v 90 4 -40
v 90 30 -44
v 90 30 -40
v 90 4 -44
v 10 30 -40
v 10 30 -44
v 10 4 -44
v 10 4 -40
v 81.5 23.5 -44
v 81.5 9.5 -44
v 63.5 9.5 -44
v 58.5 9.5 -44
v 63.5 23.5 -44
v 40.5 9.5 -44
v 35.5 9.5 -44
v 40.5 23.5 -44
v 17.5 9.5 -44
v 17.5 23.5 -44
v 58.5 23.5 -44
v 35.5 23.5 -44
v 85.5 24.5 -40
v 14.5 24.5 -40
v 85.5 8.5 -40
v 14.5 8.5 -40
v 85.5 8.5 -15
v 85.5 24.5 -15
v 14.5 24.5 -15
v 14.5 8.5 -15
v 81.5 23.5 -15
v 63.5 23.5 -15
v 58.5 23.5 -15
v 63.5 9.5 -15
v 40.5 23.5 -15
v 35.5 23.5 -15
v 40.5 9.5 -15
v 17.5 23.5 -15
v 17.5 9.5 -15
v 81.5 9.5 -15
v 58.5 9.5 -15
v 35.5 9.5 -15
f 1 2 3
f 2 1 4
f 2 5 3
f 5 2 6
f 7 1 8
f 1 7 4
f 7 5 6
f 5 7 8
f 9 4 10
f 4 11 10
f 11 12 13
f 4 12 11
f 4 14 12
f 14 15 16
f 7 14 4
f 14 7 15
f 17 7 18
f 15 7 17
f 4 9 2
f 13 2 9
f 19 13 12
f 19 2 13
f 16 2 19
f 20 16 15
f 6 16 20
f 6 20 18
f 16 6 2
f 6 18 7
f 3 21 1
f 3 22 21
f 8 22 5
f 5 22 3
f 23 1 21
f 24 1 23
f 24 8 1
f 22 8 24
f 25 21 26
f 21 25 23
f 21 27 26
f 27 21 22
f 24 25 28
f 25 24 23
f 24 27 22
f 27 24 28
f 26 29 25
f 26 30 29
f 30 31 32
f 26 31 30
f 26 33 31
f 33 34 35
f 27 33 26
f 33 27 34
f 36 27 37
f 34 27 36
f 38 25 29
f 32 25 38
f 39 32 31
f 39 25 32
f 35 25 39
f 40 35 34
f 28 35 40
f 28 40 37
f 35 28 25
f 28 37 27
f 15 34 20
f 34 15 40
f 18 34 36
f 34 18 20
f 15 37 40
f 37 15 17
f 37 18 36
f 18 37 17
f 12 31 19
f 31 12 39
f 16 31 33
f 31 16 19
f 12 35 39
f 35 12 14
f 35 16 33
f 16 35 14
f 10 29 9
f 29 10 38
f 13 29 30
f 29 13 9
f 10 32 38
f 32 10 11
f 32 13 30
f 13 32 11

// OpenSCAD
$fn=100;
// 高15mm

//BigBox();

//Rooms();

//rotate([90,0,0])
//WaterBox();
//scale([1,1,2])Room(50,20);


rotate([-90,0,0])
WaterBoxLid();

module WaterBoxLid()
{
    difference() {
        union() {
        translate([10,40,4])cube([80,4,30-4]);
        translate([14+0.5,14+1,8+0.5]) cube([80-8-1,30-1,30-8-4-1-1]);
        }
    
        translate([13+0.5+4,14,9+0.5]) cube([18,35,30-8-4-3-1]);
        
        translate([13+0.5+27,14,9+0.5]) cube([18,35,30-8-4-3-1]);
        
        translate([13+0.5+50,14,9+0.5]) cube([18,35,30-8-4-3-1]);
    }
}

module WaterBox()
{
    difference() {
        union() {
            translate([-30,0,4])cube([150-1,40-1,30-4-1]);
        
            translate([-30,0,4])cube([30-1,55,30-4-1]);
             
        }
        
    ScrewHole();
    translate([14,14,8-0.5]) cube([80-8,40,30-8-4]);
          //  translate([14,4,8]) cube([95,30,30-8-4]);
            translate([-30+4,10,8-0.5]) cube([140,25,30-8-4]);
        
        translate([-20+5,83,17-0.5])rotate([90,0,0])cylinder(d=22,h=50);
    }
}

module SwitchKey()
{
    rotate([180,0,0]) {
MyTranslateCube(0,0,0,29,4-0.6,10-0.6);
MyTranslateCube(0,0,-8,3,4-0.6,17-0.6);
    }
}

module Tunnel(x,y)
{
    translate([y/2,0,y/2])rotate([0,90,0]) {
        sphere(d=y);
        cylinder(d=y,h=x);
        translate([0,0,x])sphere(d=y);
    }
}
module Room(x, y, z=3)
{
    scale([1,1,z])Tunnel(x,y);
}

module Rooms()
{
    translate([153,15,20]) Tunnel(280-153,7);
   // translate([5,15,5]) Room(20,15);
   // translate([42,15,5]) Room(30,15);
   // translate([90,15,5]) Room(30,15);
    translate([175,15,5]) Room(20,12);
    translate([210,15,5]) Room(30,13);
    translate([255,15,5]) Room(25,15);
    
    
    translate([125,33,20]) Tunnel(280-125,7);
   // translate([5,33,5]) Room(30,15);
   // translate([52,33,5]) Room(40,15);
    translate([125,33,5]) Room(20,13);
  //  translate([175,33,5]) Room(20,12);
    translate([210,33,5]) Room(25,13);
    translate([250,33,5]) Room(30,15);
    
    
    translate([10,51,20]) Tunnel(270,7);
   // translate([5,51,5]) Room(35,15);
    translate([75,51,5]) Room(20,13);
    translate([115,51,5]) Room(20,13);
    translate([152,51,5]) Room(25,12);
    translate([225,51,5]) Room(25,13);
    translate([265,51,5]) Room(13,15);
    
    
    translate([98,69,20]) Tunnel(280-98,7);
   // translate([5,69,5]) Room(20,15);
   // translate([42,69,5]) Room(30,15);
    translate([95,69,5]) Room(10,15);
    translate([126,69,5]) Room(24,12);
    translate([200,69,5]) Room(40,13);
    translate([255,69,5]) Room(25,15);
    
    
    translate([100,85,20]) Tunnel(280-100,7);
   // translate([5,85,5]) Room(20,13);
  //  translate([42,85,5]) Room(30,13);
    translate([90,85,5]) Room(30,13);
    translate([170,85,5]) Room(25,12);
    translate([210,85,5]) Room(30,13);
    translate([255,85,5]) Room(25,13);
    
    translate([150,-18,20]) rotate([0,0,90])Tunnel(26,7);
    
    translate([150-5,10,20]) rotate([0,0,30]) Room(75,7);
    
    translate([150,100-15,20]) rotate([0,0,90])Tunnel(26,7);
    
    translate([150-5,100-10,20]) rotate([0,0,-30]) Room(76,7);
    
    translate([145,4,-1])cube([10,1,40]);
    translate([145,100-4,-1])cube([10,1,40]);
    
   // translate([171,20,-1])rotate([0,0,30+90])cube([10,1,40]);
    
    //translate([203,38,-1])rotate([0,0,30+90])cube([10,1,40]);
    
    translate([194,56,-1])rotate([0,0,-30+90])cube([10,1,40]);
    
    translate([164,72.2,-1])rotate([0,0,-30+90])cube([10,1,40]);
    
    translate([172,10,-1])rotate([0,0,90])cube([10,1,40]);
    
    translate([164,28,-1])rotate([0,0,90])cube([10,1,40]);
    
    translate([206,28,-1])rotate([0,0,90])cube([10,1,40]);
    
    translate([192,46,-1])rotate([0,0,90])cube([10,1,40]);
    
    translate([222,46,-1])rotate([0,0,90])cube([10,1,40]);
    
    //translate([197,65,-1])rotate([0,0,90])cube([10,1,40]);
    
   // translate([140,80,-1])rotate([0,0,90])cube([10,1,40]);
    
}

module BigBox() 
{
    
    difference() {
        union() {
            cube([300,100,30]);
        }

      //  Rooms();
        
        ScrewHole();
        translate([-0.01,-0.01,4])cube([120,40,30]);
        translate([10,30,4])cube([80,50,30]);
     
    }
    

    
}
module DoorSwitchHole2()
{
}


module DoorSwitchHole()
{
    translate([38,0,0]) {
        
        MyTranslateCube(4,4,-3,54-4-15,4,17);// 下出口阀门
        MyTranslateCube(4,4,4,50,4,10);
    }
    
    translate([17,88,0]){
        MyTranslateCube(4,4,-3,55-4-15,4,17);// 下出口阀门
        MyTranslateCube(4,4,4,50,4,10);
    };
    translate([74.6,19,0]){
        MyTranslateCube(4,4,-3,55-4-15,4,17);// 下出口阀门
        MyTranslateCube(4,4,4,50,4,10);
    };
    translate([107.8,2*19,0]){
        MyTranslateCube(4,4,-3,55-4-15,4,17);// 下出口阀门
        MyTranslateCube(4,4,4,50,4,10);
    };
    translate([140.7,3*19,0]){
        MyTranslateCube(4,4,-3,55-4-15,4,17);// 下出口阀门
        MyTranslateCube(4,4,4,50,4,10);
    };
    
    translate([172.7,4*19,0]){
        MyTranslateCube(4,4,-3,55-4-15,4,17);// 下出口阀门
        MyTranslateCube(4,4,4,50,4,10);
    };
    
}
module ScrewHole()
{
        translate([5,5,-1])cylinder(d=3.4,h=32);
        translate([300-5,5,-1])cylinder(d=3.4,h=32);
        translate([5,100-5,-1])cylinder(d=3.4,h=32);
        translate([300-5,100-5,-1])cylinder(d=3.4,h=32);
       
        translate([5,59,-1])cylinder(d=3.4,h=32);
        translate([300-5,59,-1])cylinder(d=3.4,h=32);
        translate([132,59,-1])cylinder(d=3.4,h=32);
            
        translate([116,100-5,-1])cylinder(d=3.4,h=32);
        translate([222,100-5,-1])cylinder(d=3.4,h=32);
            
        translate([116,5,-1])cylinder(d=3.4,h=32);
        translate([222,5,-1])cylinder(d=3.4,h=32);
}

module Cell()
{
    difference() {
        union() {
            translate([0,15+4,0])cube([300,4,30]);
            translate([0,15+4 + 19,0])cube([300,4,30]);
            translate([0,15+4 + 2*19,0])cube([300,4,30]);
            translate([0,15+4 + 3*19,0])cube([300,4,30]);
            
            //第一行
            translate([35,0,0])SmallWall();
            translate([140,0,0])SmallWall();
            translate([180,0,0])SmallWall();
            translate([250,0,0])SmallWall();
            
            //第二行
            translate([55,19,0])SmallWall();
            translate([110,19,0])SmallWall();
            translate([170,19,0])SmallWall();
            translate([200,19,0])SmallWall();
            translate([245,19,0])SmallWall();
            
            //第三行
            translate([30,2*19,0])SmallWall();
            translate([80,2*19,0])SmallWall();
            translate([150,2*19,0])SmallWall();
            translate([210,2*19,0])SmallWall();
            translate([260,2*19,0])SmallWall();
            
            //第四行
            translate([50,3*19,0])SmallWall();
            translate([90,3*19,0])SmallWall();
            translate([130,3*19,0])SmallWall();
            translate([190,3*19,0])SmallWall();
            translate([240,3*19,0])SmallWall();
            
            // 第五行
            translate([110,4*19,0])SmallWall();
            translate([180,4*19,0])SmallWall();
            translate([220,4*19,0])SmallWall();
            
            translate([100+8,0,0])rotate([0,0,30])cube([153,4,18]);
            
            translate([60+6.5,100-24,0])rotate([0,0,30])cube([40,4,18]);
        }
         // 通道洞
        translate([100,0,4])rotate([0,0,30])cube([153+10,4,8]);
        
        ScrewHole();
        DoorSwitchHole();
    }
}

module SmallWall()
{
    difference() {
        cube([4,20,30]);
        translate([-1,4,20])cube([6,6,6]);
    }
}


//DoorSwitch();
module DoorSwitch()
{
    difference() {
        MyTranslateCube(0,0,0,50,12,18);
        MyTranslateCube(4,4,4,55,4,10);
        MyTranslateCube(4,4,-3,54-4-15,4,17);
        //DoorSwitchHole();
    }
    
}

module MyTranslateCube(x,y,z,x1,y1,z1)
{
     translate([x+y*cos(30)/sin(30),y,z])MyCube(x1,y1,z1);
}

      //  MyTranslateCube(4,4,-3,50-4-15,4,17);// 下出口阀门
 //       MyTranslateCube(4,4,4,55,4,10);

//translate([0,0,30])MyCube(50,10,18);
    
    
//MyCube2(50,10,18);
module MyCube(x,y,z)
{
   linear_extrude(height = z, center = false, convexity = 10, twist = 0)
    
    polygon(points=[[0,0],[y/sin(30)*cos(30),y],[y/sin(30)*cos(30)+x,y],[x,0]]);
//        difference() {
//            cube([x,y,z]);
//            rotate([0,0,30])translate([0,0,-1])cube([x,y,z+2]);
//        }
//        translate([x,0,0])intersection() {
//            cube([x,y,z]);
//            rotate([0,0,30])translate([0,0,-1])cube([x,y,z+2]);
//        } 
    
}

//translate([50.1,0,0])MyCube(50,12,18);
module MyCube2(x,y,z)
{
   
        difference() {
            cube([x,y,z]);
            rotate([0,0,30])translate([0,0,-1])cube([x,y,z+2]);
        }
        translate([x,0,0])intersection() {
            cube([x,y,z]);
            rotate([0,0,30])translate([0,0,-1])cube([x,y,z+2]);
        } 
    
}


//translate([100,0,4])rotate([0,0,20])cube([80,4,10]);
//translate([150,30,4])rotate([0,0,160])cube([80,4,10]);
//translate([30,70,4])rotate([0,0,30])cube([80,4,10]);
